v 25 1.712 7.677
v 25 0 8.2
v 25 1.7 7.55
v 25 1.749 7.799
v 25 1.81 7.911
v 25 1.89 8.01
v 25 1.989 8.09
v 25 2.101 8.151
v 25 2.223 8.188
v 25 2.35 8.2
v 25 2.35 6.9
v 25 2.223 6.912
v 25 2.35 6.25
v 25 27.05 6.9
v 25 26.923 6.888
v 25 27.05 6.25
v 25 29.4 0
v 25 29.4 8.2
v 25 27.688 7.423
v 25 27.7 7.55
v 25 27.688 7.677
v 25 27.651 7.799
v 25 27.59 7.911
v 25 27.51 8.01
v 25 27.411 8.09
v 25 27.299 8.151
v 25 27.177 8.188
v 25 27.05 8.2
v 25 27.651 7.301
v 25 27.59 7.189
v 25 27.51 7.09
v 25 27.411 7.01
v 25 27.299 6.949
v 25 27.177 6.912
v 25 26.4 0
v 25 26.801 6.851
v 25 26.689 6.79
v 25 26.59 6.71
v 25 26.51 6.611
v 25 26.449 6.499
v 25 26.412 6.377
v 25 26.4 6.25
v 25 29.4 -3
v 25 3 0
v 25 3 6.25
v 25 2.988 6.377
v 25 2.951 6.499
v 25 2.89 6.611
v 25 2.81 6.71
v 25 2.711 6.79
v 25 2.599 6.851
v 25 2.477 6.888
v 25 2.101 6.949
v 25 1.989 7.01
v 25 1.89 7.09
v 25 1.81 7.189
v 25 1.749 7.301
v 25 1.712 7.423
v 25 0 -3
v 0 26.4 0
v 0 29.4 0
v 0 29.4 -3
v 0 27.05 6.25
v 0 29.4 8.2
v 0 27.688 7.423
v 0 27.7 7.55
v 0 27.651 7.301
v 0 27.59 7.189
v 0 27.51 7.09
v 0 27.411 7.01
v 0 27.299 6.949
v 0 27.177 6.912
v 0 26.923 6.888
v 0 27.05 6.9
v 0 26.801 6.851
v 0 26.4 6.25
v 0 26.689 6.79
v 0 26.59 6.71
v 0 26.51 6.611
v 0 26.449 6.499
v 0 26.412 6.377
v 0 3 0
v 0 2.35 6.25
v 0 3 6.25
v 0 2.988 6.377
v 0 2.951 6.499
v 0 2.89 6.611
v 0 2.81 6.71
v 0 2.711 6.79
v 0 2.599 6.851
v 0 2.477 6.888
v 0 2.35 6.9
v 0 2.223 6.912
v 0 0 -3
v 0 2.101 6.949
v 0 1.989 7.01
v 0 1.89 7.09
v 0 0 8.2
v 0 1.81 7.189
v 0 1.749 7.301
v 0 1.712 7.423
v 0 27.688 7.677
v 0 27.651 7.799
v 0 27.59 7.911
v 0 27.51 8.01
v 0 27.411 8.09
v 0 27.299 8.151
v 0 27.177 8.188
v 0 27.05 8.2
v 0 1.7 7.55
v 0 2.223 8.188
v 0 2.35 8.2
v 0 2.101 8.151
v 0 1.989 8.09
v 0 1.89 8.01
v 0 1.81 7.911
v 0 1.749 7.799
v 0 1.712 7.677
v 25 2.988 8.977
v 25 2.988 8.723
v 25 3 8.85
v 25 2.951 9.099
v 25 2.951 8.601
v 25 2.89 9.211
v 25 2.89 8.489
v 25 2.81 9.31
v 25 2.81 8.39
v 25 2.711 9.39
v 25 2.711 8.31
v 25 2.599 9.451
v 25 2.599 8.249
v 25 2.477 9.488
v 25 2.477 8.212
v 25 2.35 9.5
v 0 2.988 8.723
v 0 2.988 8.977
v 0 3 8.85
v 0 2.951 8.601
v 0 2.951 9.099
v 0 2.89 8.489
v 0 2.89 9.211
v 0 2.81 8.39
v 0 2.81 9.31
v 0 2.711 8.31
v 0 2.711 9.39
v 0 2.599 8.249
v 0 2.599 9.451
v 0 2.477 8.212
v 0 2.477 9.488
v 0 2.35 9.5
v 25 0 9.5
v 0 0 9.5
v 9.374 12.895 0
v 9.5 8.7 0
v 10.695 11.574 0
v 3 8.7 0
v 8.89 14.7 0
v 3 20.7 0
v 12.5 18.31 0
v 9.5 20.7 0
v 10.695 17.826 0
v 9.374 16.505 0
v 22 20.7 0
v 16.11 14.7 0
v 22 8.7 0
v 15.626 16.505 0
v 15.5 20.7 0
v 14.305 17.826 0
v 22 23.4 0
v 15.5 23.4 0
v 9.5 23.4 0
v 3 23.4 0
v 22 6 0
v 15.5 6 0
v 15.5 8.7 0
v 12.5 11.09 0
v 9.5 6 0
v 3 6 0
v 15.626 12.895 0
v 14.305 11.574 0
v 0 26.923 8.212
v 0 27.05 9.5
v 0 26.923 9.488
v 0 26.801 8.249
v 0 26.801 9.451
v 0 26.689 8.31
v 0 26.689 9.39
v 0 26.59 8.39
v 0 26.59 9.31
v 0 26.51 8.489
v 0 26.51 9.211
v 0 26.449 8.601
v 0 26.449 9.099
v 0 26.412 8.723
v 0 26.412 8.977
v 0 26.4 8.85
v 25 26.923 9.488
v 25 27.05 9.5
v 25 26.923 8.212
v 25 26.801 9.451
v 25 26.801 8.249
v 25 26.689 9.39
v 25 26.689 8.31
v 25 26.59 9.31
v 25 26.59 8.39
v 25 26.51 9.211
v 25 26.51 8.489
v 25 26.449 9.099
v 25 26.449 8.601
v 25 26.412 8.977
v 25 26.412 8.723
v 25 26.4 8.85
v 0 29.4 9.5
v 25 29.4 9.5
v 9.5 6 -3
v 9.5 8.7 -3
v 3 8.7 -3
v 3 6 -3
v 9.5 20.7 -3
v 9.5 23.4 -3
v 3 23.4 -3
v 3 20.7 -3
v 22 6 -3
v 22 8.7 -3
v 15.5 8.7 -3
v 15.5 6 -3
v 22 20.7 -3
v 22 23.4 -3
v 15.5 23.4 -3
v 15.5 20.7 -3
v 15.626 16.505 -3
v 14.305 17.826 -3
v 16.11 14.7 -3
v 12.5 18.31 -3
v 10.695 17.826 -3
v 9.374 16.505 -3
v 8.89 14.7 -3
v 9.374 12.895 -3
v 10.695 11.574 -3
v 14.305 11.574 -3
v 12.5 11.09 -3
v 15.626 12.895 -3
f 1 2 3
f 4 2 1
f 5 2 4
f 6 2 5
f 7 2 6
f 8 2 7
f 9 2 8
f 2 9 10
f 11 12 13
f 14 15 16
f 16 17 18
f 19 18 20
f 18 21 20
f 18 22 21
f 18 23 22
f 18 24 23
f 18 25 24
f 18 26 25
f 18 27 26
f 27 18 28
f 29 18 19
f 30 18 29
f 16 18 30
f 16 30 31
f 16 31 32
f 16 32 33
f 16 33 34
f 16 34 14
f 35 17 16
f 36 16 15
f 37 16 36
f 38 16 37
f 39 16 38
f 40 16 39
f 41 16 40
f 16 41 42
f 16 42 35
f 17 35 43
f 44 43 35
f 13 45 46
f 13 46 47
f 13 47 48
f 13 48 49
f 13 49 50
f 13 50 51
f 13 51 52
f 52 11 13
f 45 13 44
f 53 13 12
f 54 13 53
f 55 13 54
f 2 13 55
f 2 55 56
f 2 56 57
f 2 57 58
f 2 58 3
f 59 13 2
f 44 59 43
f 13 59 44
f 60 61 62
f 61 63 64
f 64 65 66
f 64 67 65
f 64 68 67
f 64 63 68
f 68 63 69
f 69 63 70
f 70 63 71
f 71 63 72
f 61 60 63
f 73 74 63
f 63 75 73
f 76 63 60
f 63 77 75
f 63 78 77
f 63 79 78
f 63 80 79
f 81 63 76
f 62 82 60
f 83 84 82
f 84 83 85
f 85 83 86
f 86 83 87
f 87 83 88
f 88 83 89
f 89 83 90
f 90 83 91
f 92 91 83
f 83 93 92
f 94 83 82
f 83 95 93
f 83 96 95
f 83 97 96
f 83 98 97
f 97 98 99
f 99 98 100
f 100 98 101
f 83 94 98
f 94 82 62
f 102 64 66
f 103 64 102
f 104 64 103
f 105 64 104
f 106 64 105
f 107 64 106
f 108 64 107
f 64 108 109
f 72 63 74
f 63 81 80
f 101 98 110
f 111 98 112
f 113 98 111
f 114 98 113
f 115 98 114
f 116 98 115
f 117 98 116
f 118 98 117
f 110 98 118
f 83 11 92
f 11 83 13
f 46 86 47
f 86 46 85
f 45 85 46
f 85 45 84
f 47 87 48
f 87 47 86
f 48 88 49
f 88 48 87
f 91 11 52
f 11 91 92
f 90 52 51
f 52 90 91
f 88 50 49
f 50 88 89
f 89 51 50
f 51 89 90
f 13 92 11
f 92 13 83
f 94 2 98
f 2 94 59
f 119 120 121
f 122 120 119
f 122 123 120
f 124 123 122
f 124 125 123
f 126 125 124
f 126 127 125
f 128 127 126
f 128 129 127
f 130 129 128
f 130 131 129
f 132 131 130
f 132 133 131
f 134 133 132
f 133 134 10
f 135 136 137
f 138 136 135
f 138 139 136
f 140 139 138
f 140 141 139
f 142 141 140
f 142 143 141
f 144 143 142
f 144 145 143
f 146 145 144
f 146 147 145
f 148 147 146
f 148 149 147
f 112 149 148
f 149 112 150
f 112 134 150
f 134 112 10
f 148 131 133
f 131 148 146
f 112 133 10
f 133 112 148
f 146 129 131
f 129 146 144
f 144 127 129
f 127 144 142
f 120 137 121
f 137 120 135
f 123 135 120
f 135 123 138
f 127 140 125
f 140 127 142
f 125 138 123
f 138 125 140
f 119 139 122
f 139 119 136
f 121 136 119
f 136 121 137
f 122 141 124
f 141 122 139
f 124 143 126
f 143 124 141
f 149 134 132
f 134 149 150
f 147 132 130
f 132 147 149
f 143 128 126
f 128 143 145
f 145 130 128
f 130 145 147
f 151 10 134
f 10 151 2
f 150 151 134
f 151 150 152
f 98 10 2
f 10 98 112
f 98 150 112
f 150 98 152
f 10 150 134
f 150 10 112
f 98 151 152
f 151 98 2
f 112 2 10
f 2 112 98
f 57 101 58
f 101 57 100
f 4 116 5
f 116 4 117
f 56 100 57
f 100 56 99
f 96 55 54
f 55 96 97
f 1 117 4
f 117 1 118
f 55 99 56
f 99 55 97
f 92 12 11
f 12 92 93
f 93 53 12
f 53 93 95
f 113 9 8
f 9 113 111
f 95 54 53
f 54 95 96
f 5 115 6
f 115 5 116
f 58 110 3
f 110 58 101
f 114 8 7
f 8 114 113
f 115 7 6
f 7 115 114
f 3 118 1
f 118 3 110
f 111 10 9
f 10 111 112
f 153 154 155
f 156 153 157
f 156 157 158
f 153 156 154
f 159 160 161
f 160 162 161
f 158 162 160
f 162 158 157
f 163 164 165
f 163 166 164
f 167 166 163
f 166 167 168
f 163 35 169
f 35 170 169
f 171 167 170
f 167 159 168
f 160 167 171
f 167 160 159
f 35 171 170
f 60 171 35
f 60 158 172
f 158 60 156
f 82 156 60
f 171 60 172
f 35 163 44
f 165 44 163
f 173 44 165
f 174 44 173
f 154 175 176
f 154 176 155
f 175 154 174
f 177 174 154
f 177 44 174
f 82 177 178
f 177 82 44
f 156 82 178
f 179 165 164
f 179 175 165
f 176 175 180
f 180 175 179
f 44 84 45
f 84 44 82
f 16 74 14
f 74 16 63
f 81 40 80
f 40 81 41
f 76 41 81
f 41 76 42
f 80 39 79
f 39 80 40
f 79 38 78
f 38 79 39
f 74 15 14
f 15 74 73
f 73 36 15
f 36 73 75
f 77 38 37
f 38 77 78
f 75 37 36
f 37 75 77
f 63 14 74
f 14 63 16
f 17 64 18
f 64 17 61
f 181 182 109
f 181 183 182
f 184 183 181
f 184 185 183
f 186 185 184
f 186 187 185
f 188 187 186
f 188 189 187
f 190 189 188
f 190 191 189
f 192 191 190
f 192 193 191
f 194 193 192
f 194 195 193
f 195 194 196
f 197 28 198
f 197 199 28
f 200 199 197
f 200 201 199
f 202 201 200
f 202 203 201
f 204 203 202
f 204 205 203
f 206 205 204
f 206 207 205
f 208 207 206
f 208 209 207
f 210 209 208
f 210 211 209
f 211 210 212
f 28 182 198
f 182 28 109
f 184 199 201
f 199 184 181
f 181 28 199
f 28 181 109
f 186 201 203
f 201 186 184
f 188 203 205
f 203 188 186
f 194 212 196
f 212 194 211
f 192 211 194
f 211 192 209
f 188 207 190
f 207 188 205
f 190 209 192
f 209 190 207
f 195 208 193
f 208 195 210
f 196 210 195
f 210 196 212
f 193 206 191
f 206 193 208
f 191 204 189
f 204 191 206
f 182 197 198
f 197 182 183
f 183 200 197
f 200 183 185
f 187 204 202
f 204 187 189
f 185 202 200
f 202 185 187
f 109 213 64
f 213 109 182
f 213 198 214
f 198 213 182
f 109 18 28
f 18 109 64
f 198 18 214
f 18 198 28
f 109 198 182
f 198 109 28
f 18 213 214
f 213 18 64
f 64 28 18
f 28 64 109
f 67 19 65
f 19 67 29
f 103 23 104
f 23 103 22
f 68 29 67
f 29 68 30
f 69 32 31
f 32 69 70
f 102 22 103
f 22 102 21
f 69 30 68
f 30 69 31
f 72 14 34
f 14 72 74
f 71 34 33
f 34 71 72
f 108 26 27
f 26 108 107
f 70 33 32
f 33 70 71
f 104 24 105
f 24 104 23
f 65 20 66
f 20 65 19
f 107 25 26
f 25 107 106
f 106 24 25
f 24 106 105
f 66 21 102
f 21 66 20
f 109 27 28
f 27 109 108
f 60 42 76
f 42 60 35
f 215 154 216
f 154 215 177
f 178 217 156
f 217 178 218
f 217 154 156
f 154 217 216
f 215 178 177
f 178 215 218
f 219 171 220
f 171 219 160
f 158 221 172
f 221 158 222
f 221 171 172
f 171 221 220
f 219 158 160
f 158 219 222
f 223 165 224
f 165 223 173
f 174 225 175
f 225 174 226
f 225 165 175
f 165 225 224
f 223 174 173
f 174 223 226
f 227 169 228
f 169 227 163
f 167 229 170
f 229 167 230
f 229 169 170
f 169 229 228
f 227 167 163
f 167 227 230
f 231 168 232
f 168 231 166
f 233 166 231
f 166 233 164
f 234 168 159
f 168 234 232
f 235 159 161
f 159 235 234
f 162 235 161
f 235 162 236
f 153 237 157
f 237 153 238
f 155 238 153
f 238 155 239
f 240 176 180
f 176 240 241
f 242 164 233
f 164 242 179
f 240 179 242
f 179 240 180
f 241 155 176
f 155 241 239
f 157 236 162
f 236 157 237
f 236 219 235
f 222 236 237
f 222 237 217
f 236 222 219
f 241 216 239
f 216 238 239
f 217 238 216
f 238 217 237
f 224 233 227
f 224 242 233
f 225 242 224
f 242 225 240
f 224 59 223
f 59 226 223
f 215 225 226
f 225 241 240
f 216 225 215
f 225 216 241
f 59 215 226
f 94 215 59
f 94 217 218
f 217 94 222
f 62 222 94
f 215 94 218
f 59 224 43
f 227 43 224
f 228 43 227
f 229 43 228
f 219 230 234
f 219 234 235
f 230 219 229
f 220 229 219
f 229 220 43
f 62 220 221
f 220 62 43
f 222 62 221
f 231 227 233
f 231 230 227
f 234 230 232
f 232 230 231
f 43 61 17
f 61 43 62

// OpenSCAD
// file: Library-Shapes.scad
//roundedcorner(4, 10);
//roundedbox(65,45,4, 8);
//roundedshelf(65, 45, 4);
//roundedgroove(65, 3, 2);
groovedwall(length=45, height=9, thickness=3, groovedepth=4.5);

module roundedcorner(height, radius)
{
	intersection()
	{
		cube(size=[radius, radius, height]);
		color([1,0,0]) cylinder(h=height, r=radius, $fn=32);
	}
}

module roundedbox( length, width, height, radius)
{
	strutlength = length - radius*2;
	strutwidth = width - radius*2;

	translate([length-radius, width-radius, 0]) rotate([0,0,0]) roundedcorner(height, radius);

	translate([radius, width-radius, 0]) rotate([0,0,90]) roundedcorner(height, radius);
	
	translate([radius, radius, 0]) rotate([0,0,180]) roundedcorner(height, radius);
	
	translate([length-radius, radius, 0]) rotate([0,0,270]) roundedcorner(height, radius);

	// Connect corners with filler rectangles
	translate([radius, width-radius,0]) cube(size=[strutlength, radius, height]);
	translate([radius, 0,0]) cube(size=[strutlength, radius, height]);
	translate([0, radius, 0]) cube(size=[radius,strutwidth,height]);
	translate([length-radius, radius, 0]) cube(size=[radius,strutwidth,height]);

	// Fill in the center rectangle
	translate([radius, radius,0]) cube(size=[strutlength, strutwidth, height]);
}

module roundedshelf(length, width, height)
{
	rotate([0,90,0]) 
	translate([-height/2,width-(height/2),0])
	union()
	{
		roundedcorner(length, height/2);
		rotate([0,0,90]) roundedcorner(length, height/2);
	}

	cube(size=[length, width-height/2, height]);
}

module roundedgroove(length, width, height)
{
	difference()
	{
		union()
		{
			roundedshelf(length, width, height/3);
			translate([0,0,height/3]) cube(size=[length, width-height/3/2, height/3]);
			translate([0,0,(height/3)*2]) roundedshelf(length, width, height/3);
		}

		// subtract a cylinder to make the smooth bottom of the track
		rotate([0,90,0]) 
		translate([-(height/3)-(height/3)/2,width-height/3/2,-0.25]) 
			cylinder(h=length+0.5, r=(height/3)/2, $fn=32);
	}
}

module groovedwall(length, height, thickness, groovedepth)
{
	lowerwallheight = height - groovedepth + groovedepth/3/2;
	
	union()
	{
	// place the lower wall
	color([0,0,1]) cube(size=[length, thickness, lowerwallheight]);
	
	// Place the grooved portion
	translate([0,0,height-groovedepth])
	roundedgroove(length, thickness, groovedepth);
	}
}
// main file
use <Library-Shapes.scad>

// The following are a couple of templates to create harnesses for well known pcbs
// comment out the one you want, or create a new one.
// The 'length' is the length of the board, connected to the harness
// the 'width' is the other dimension
// You can leave the others as is, or alter, and experiment to suit your needs

// For Arduino Duemilanove - Also works with standard Arduino shields
//pcbholder( length = 66, width = 53.75, bottomclearance= 5, pcbthickness=2, slotdepth=2, grooveclearance=1.3);

// Arduino MEGA - Also works with standard Arduino shields
//pcbholder( length = 100, width = 53.75, bottomclearance= 3, pcbthickness=2, slotdepth=2, grooveclearance=1.3);

//LeafLabs Maple - Shorter than an Arduino
//pcbholder( length = 53, width = 53.75, bottomclearance= 3, pcbthickness=2, slotdepth=2, grooveclearance=1.3);

// Web Platform v1c - http://www.dangerousprototypes.com
//pcbholder( length = 50.5, width = 88, bottomclearance= 3, pcbthickness=2, slotdepth=2, grooveclearance=1.3);

// Battery Charger - http://www.adafruit.com (usb/dc adjustable LiPo charger
//pcbholder( length = 40.9, width = 44.5, bottomclearance= 3, pcbthickness=2, slotdepth=2, grooveclearance=1.3);

// LPC1343 Reference - http://www.microbuilder.eu
//pcbholder( length = 95.3, width = 70.5, bottomclearance= 3, pcbthickness=2, slotdepth=2, grooveclearance=1.3);

// Parallax Propeller demo Rev g 2008 - http://www.parallax.com
//pcbholder( length = 76.5, width = 76.5, bottomclearance= 3, pcbthickness=2, slotdepth=2, grooveclearance=1.3);

// Bus Pirate BPv3 - http://www.dangerousprototypes.com
//pcbholder( length = 52, width =29.5, bottomclearance= 3, pcbthickness=2, slotdepth=2, grooveclearance=1.3);

//RFBee v1.1 - http://www.seeedstudio.com
pcbholder( length = 25, width =26, bottomclearance= 7, pcbthickness=1, slotdepth=2, grooveclearance=1.3);








module pcbholdersingleholestencil(length, width, basethickness, wallthickness, holeradius)
{
	radius = 7.22/2;
	borderwidth = wallthickness;
	rectwidth = width/2.0 - borderwidth*4 ;
	rectlength = length/2.0 - borderwidth*2;


	// Subtract large rectangular chunks
	translate([borderwidth, borderwidth*2, -0.25])
		cube(size=[rectlength, rectwidth, basethickness+0.5]);

	translate([borderwidth, width/2 + borderwidth*2, -0.25])
		cube(size=[rectlength, rectwidth, basethickness+0.5]);


	translate([length - borderwidth-rectlength, borderwidth*2, -0.25])
		cube(size=[rectlength, rectwidth, basethickness+0.5]);

	translate([length - borderwidth-rectlength, borderwidth*2+width/2.0, -0.25])
		cube(size=[rectlength, rectwidth, basethickness+0.5]);

	// Remove the center hole
	translate([length/2, width/2.0, -0.25])
		cylinder(h = basethickness+0.5, r=holeradius, $fn = 12);

		//translate([length/2, width/2+wallextent,0])
			//cylinder(h=basethickness, r= holeradius+1.5);

}

// Create the base, with stencils cutout
module pcbholderbase(length, width, basethickness, wallthickness, grooveclearance)
{
	wallextent = wallthickness - grooveclearance;
	basewidth = width+wallextent*2;
	holeradius = 7.22/2;

	union()
	{
		difference()
		{
			// Start with a basic flat surface
			cube(size=[length,basewidth, basethickness]);
	
			// cutout stencil
			pcbholdersingleholestencil(length, basewidth, basethickness, wallthickness, holeradius);
		}
	
	}
}

// Main routine to generate a holder
module pcbholder(length, width, bottomclearance, pcbthickness, grooveclearance)
{
	wallthickness = 3;
	basethickness = 3;
	wallextent = wallthickness - grooveclearance;
	basewidth = width+wallextent*2;

	// Wall	
	groovedwall(length,  bottomclearance+pcbthickness*2.5, wallthickness, groovedepth=grooveclearance*3); 

	// Wall
	rotate([0,0,180])
	translate([-length,-basewidth,0]) 
		groovedwall(length,  bottomclearance+pcbthickness*2.5, wallthickness, groovedepth=grooveclearance*3); 
	

	// Base
	translate([0, 0, -basethickness])
		pcbholderbase(length, width, basethickness, wallthickness, grooveclearance);
}
